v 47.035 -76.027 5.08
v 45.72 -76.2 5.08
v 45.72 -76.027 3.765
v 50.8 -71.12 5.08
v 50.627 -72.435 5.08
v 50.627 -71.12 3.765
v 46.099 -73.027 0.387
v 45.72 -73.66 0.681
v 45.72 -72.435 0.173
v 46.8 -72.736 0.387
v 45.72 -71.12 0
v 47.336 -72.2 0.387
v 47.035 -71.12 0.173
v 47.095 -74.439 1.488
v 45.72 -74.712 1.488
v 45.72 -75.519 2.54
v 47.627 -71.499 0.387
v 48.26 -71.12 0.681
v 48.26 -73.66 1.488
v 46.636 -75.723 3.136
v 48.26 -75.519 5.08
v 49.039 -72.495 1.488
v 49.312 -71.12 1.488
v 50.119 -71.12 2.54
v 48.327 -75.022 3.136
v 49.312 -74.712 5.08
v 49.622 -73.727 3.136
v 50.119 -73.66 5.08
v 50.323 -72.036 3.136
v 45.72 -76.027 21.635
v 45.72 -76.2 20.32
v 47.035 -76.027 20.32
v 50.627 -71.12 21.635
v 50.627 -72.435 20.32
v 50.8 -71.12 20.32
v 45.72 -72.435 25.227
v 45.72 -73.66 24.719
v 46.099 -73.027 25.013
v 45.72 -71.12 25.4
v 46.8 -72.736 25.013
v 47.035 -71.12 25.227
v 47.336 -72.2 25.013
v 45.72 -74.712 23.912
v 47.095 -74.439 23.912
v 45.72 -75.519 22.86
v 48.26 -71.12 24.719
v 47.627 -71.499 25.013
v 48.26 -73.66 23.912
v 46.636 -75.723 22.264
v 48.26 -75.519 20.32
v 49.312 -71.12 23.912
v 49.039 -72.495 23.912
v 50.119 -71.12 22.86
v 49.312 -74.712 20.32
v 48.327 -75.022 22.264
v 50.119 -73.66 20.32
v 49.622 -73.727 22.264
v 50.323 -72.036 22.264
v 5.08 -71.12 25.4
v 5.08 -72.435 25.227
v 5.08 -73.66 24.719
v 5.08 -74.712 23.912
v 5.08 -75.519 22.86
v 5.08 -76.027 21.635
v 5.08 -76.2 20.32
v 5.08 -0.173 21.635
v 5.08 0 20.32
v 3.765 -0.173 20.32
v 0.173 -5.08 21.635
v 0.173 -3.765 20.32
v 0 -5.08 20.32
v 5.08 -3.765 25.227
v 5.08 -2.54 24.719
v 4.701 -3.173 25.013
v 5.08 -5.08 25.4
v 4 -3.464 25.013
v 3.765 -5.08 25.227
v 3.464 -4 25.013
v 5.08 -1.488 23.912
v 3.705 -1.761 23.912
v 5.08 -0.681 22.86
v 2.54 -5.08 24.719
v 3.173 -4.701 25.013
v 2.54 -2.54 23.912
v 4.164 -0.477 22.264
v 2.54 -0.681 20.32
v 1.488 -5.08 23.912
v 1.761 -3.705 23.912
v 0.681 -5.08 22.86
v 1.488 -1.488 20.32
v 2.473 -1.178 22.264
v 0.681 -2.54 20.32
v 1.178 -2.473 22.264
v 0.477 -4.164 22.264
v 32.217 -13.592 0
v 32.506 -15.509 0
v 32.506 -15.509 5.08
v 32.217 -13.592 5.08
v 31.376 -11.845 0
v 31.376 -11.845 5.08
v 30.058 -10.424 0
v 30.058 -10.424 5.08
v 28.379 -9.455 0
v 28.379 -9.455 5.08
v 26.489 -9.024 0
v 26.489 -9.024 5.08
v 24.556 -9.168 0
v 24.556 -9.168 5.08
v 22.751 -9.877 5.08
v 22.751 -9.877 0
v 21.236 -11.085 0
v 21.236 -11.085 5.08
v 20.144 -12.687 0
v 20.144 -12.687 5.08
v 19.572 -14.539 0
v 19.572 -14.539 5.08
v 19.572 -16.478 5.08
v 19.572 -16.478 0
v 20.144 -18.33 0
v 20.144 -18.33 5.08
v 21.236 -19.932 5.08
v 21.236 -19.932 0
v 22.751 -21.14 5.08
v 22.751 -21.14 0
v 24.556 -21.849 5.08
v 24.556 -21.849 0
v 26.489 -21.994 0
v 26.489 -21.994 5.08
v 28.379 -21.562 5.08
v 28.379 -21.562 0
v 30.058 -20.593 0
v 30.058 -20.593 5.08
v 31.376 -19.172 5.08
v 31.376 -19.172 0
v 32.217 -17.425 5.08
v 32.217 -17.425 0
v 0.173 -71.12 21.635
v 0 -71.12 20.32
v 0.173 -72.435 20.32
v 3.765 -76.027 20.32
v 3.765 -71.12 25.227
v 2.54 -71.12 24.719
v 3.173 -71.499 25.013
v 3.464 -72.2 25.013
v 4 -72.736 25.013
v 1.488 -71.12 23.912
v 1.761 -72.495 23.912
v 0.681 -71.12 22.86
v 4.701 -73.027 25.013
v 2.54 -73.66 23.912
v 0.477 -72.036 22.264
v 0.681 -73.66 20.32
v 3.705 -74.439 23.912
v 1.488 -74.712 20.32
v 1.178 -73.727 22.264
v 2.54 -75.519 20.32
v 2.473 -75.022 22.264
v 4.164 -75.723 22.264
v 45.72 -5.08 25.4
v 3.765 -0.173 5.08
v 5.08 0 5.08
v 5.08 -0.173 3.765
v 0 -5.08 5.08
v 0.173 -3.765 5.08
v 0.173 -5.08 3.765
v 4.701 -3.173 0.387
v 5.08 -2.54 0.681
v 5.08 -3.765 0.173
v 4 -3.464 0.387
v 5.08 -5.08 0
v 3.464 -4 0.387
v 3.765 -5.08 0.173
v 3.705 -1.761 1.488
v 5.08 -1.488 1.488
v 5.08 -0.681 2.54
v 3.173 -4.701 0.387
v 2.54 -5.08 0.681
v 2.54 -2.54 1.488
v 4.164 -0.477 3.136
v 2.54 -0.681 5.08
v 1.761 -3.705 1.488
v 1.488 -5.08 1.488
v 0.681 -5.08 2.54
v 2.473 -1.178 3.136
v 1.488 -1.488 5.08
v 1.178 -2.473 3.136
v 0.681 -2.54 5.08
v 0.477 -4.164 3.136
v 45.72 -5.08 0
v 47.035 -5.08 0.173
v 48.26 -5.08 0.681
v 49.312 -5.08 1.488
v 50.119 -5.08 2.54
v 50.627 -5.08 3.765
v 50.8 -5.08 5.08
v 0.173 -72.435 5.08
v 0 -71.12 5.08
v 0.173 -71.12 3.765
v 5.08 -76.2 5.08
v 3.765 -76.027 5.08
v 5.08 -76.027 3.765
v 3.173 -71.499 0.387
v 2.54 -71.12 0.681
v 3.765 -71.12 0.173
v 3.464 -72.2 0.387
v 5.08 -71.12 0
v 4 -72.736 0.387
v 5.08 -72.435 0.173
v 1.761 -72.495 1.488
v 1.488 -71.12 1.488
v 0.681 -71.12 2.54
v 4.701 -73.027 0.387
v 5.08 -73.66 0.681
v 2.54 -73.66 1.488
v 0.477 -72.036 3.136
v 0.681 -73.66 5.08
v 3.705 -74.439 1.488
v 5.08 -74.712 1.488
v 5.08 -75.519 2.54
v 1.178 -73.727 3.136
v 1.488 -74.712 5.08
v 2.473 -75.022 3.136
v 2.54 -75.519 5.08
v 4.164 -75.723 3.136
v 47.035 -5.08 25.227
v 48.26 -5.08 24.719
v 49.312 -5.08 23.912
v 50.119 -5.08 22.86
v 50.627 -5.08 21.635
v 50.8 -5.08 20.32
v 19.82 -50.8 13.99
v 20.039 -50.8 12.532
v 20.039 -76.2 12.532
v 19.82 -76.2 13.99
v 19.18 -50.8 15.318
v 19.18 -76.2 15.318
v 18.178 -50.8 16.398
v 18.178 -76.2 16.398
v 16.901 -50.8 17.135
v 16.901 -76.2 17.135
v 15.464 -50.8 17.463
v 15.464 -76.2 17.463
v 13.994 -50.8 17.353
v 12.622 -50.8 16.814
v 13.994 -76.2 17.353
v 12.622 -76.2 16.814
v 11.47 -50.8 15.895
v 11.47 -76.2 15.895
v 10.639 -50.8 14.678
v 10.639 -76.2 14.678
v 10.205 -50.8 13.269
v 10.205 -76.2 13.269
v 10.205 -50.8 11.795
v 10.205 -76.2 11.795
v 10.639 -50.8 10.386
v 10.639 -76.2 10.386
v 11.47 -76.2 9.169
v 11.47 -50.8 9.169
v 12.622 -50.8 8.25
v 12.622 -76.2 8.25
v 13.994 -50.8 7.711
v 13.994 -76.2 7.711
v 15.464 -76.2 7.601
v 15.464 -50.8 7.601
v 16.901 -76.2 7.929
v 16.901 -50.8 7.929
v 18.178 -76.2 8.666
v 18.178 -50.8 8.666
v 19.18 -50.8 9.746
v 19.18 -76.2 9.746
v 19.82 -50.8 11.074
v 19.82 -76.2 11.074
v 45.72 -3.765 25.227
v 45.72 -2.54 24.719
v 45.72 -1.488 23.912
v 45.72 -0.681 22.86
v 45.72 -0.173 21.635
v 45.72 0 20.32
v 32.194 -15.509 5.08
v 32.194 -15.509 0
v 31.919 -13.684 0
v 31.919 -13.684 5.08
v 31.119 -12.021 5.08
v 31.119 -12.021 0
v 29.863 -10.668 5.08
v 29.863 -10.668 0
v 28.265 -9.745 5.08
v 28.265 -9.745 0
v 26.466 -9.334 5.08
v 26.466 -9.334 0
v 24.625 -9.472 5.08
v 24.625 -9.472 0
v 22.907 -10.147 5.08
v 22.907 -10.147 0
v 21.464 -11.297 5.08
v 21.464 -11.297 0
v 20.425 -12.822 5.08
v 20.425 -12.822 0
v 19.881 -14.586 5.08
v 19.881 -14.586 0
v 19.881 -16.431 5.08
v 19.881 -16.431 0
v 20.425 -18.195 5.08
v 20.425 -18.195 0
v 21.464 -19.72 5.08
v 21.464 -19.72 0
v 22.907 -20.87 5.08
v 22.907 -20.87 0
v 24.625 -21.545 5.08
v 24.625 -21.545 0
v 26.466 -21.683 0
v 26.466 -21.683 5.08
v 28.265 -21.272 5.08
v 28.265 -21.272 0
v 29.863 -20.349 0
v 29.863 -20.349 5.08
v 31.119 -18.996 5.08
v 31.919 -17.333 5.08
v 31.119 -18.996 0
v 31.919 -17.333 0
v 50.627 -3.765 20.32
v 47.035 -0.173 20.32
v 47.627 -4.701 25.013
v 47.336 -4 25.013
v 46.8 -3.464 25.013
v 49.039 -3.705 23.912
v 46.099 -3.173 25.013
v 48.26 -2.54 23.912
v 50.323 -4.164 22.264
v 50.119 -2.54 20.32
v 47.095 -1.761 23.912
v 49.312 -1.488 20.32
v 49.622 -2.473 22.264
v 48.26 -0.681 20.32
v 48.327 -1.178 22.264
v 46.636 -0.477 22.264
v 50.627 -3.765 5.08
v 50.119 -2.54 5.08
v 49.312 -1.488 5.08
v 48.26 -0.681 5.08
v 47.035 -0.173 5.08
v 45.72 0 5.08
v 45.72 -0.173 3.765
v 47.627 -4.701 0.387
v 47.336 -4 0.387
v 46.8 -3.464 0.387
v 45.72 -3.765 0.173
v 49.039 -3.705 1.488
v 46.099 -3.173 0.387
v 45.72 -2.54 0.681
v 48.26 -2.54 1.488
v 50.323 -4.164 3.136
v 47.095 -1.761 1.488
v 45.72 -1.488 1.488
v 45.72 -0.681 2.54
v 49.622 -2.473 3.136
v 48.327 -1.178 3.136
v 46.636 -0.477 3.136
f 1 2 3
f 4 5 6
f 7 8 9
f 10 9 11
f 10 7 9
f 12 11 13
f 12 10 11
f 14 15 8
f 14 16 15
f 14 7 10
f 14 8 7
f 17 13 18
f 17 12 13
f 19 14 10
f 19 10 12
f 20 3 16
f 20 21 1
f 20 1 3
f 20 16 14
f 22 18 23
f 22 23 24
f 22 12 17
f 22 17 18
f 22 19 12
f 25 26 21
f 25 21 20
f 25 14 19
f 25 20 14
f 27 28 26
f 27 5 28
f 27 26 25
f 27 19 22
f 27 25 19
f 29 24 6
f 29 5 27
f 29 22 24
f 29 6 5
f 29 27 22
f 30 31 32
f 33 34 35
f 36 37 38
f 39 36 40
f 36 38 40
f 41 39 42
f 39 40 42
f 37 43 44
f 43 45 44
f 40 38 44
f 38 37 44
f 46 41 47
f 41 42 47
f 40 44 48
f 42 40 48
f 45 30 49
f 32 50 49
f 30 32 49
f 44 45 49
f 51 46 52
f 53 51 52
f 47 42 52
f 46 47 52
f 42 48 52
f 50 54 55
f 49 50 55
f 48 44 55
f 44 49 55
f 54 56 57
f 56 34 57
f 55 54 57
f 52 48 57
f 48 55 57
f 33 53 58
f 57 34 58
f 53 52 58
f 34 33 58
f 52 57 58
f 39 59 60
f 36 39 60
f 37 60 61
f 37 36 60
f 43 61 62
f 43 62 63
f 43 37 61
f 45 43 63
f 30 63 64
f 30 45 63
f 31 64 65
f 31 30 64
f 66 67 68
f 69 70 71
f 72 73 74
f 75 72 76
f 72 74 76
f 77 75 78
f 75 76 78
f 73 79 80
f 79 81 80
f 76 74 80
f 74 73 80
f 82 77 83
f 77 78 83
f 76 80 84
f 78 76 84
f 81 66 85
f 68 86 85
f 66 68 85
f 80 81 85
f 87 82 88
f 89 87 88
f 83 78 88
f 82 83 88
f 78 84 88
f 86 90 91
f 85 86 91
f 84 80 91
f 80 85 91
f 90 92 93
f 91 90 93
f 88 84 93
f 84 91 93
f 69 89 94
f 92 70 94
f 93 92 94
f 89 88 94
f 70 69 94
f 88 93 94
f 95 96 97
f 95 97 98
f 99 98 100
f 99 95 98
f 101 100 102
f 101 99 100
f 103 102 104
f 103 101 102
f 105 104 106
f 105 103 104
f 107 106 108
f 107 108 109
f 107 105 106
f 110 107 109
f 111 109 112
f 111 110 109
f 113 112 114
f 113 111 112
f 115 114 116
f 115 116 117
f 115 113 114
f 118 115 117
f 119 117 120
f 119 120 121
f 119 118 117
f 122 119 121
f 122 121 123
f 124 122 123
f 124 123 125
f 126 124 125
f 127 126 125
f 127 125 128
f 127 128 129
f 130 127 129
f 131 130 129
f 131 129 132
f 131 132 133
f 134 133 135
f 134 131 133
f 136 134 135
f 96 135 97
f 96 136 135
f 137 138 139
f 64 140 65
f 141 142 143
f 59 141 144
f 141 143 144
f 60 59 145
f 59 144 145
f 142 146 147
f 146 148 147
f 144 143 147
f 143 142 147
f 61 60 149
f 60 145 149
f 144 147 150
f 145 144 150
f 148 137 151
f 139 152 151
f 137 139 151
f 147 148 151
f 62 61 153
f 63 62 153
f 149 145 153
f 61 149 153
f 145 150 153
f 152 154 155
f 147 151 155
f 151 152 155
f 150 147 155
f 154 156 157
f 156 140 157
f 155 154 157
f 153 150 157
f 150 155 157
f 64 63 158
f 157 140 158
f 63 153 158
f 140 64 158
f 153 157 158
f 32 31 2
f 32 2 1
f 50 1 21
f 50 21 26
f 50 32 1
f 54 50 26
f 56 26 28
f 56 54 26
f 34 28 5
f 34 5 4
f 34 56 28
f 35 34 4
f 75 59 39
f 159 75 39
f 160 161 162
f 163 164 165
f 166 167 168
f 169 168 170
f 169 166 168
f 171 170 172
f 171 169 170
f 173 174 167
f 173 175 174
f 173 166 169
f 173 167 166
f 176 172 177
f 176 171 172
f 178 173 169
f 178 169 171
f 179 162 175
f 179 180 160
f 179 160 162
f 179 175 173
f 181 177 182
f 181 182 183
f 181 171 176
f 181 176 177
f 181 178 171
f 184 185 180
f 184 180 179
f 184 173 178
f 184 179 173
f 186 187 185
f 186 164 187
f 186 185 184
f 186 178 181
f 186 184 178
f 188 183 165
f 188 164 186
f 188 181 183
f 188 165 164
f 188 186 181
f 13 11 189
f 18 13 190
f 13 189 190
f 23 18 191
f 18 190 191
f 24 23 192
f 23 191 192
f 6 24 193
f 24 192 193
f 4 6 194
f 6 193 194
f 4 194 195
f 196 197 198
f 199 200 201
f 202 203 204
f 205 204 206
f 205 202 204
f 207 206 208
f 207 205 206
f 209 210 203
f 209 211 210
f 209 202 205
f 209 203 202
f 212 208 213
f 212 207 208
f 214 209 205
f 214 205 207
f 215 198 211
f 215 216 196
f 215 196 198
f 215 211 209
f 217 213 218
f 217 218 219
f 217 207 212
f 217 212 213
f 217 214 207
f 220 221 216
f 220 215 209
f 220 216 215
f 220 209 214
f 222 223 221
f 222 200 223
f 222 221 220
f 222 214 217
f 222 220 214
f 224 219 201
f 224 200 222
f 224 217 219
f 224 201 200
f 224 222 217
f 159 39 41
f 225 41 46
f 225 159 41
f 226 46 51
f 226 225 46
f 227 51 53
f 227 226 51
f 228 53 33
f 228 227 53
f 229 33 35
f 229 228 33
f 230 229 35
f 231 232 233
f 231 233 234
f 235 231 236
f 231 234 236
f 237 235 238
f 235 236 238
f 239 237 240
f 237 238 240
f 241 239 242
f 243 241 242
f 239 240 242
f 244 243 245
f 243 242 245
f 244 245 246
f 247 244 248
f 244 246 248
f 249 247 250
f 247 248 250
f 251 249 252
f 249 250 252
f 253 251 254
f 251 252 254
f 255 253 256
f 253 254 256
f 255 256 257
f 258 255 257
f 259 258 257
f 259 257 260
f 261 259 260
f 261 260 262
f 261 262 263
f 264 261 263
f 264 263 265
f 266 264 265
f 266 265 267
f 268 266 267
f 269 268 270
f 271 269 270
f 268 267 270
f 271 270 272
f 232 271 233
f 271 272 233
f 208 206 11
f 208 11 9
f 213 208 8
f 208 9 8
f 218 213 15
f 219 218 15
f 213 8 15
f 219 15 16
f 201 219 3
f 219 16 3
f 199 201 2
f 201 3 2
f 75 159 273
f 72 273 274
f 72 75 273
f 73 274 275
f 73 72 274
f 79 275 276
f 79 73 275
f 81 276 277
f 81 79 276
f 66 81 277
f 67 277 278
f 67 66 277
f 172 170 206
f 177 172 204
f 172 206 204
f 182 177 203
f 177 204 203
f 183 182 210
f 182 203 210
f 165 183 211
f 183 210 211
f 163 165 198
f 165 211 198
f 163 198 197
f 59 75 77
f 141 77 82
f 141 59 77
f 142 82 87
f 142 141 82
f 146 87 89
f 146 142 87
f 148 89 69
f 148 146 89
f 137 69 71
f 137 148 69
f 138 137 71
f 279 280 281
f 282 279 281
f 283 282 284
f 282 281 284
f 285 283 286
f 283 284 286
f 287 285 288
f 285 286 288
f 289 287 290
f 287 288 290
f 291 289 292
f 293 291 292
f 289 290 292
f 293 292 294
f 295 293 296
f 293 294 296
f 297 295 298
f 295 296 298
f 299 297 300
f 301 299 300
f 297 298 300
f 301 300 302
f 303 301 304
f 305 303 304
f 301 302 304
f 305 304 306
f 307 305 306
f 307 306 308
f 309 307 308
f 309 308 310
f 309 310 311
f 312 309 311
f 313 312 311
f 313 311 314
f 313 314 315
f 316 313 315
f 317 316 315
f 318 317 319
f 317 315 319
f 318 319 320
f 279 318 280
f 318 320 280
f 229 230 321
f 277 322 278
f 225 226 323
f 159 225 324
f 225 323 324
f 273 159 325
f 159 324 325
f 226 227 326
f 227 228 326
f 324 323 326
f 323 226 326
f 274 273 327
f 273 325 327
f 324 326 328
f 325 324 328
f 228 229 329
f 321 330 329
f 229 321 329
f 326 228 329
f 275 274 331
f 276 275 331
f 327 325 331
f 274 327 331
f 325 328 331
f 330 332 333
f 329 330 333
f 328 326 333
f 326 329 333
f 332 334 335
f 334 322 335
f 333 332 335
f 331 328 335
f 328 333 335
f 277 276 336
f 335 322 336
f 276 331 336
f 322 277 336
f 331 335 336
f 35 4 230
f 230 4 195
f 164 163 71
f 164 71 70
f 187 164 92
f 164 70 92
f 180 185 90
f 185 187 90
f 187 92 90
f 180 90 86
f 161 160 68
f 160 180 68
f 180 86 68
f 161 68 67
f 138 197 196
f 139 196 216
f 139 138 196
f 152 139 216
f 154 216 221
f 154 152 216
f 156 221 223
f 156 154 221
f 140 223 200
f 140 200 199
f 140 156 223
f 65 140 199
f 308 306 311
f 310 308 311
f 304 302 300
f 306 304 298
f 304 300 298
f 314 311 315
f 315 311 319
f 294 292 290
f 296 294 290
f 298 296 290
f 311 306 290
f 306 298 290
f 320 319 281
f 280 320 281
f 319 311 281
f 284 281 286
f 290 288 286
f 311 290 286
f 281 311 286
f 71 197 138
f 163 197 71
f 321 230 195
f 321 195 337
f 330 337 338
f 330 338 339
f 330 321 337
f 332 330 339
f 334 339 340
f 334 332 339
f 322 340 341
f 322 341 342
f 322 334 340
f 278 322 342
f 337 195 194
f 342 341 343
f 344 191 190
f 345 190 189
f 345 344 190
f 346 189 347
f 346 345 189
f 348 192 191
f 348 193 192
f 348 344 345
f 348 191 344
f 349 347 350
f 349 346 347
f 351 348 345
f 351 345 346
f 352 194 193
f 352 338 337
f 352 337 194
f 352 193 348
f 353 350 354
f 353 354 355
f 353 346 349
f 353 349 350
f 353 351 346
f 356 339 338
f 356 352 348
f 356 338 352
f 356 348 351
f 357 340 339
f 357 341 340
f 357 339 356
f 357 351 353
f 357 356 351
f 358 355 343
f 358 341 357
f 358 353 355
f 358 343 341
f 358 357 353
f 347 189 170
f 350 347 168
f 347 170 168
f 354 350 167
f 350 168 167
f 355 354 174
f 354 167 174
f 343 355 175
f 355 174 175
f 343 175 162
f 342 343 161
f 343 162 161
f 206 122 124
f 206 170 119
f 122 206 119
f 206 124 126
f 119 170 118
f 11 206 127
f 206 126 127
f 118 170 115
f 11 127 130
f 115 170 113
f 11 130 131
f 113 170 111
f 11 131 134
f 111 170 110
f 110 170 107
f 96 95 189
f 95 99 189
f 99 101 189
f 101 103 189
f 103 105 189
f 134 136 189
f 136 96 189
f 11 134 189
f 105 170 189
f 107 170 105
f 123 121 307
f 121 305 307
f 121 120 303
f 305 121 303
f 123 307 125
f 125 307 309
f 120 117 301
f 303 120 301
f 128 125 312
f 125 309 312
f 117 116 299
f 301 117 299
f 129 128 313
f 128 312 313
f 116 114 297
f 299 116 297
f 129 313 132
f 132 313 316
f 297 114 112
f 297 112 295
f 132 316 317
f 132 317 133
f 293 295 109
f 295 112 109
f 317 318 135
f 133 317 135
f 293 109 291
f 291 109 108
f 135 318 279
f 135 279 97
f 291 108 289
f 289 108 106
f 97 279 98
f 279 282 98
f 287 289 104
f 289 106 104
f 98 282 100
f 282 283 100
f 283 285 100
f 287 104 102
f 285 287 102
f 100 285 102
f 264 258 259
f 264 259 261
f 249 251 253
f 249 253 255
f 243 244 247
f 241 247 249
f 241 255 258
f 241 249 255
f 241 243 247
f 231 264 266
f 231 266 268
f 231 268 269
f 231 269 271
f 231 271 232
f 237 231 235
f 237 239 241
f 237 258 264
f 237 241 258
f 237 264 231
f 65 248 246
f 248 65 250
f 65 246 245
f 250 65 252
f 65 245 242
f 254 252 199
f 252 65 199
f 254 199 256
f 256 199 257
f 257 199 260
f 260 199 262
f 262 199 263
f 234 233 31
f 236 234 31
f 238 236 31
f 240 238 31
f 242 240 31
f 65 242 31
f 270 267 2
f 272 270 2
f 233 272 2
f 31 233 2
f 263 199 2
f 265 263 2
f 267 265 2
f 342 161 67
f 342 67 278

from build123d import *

# Parameters (mm, degrees)
F0_W     = 50.8
F0_H     = 76.2
F1_DEPTH = 25.4
F2_R     = 5.08
F3_R     = 4.94494
F4_DEPTH = 25.4
F5_R     = 5.08
F6_R     = 6.503178
F6_R_2   = 6.191373
F7_DEPTH = 5.08


with BuildPart() as f1:
    # F0 (on Top) → F1 (new body)
    with BuildSketch(Plane.XY):
        with Locations((25.4, -38.1)):
            Rectangle(F0_W, F0_H)
    extrude(amount=F1_DEPTH)

    # F2
    f2_edges = [f1.edges().sort_by_distance(p)[0] for p in [
        (0, -76.2, 12.7),
        (50.8, -76.2, 12.7),
        (50.8, 0, 12.7),
        (0, 0, 12.7),
    ]]
    fillet(f2_edges, radius=F2_R)

    # F3 (on face) → F4 (cut)
    with BuildSketch(Plane.XZ.offset(76.2)):
        with Locations((15.094488, 12.532027)):
            Circle(F3_R)
    extrude(amount=-F4_DEPTH, mode=Mode.SUBTRACT)

    # F5
    f5_edges = [f1.edges().sort_by_distance(p)[0] for p in [
        (25.4, -76.2, 25.4),
        (25.4, -76.2, 0),
    ]]
    fillet(f5_edges, radius=F5_R)

    # F6 (on face) → F7 (cut)
    with BuildSketch(Plane.XY):
        with Locations((26.003035, -15.508536)):
            Circle(F6_R)
        with Locations((26.003035, -15.508536)):
            Circle(F6_R_2, mode=Mode.SUBTRACT)
    extrude(amount=F7_DEPTH, mode=Mode.SUBTRACT)


solid = f1.part
